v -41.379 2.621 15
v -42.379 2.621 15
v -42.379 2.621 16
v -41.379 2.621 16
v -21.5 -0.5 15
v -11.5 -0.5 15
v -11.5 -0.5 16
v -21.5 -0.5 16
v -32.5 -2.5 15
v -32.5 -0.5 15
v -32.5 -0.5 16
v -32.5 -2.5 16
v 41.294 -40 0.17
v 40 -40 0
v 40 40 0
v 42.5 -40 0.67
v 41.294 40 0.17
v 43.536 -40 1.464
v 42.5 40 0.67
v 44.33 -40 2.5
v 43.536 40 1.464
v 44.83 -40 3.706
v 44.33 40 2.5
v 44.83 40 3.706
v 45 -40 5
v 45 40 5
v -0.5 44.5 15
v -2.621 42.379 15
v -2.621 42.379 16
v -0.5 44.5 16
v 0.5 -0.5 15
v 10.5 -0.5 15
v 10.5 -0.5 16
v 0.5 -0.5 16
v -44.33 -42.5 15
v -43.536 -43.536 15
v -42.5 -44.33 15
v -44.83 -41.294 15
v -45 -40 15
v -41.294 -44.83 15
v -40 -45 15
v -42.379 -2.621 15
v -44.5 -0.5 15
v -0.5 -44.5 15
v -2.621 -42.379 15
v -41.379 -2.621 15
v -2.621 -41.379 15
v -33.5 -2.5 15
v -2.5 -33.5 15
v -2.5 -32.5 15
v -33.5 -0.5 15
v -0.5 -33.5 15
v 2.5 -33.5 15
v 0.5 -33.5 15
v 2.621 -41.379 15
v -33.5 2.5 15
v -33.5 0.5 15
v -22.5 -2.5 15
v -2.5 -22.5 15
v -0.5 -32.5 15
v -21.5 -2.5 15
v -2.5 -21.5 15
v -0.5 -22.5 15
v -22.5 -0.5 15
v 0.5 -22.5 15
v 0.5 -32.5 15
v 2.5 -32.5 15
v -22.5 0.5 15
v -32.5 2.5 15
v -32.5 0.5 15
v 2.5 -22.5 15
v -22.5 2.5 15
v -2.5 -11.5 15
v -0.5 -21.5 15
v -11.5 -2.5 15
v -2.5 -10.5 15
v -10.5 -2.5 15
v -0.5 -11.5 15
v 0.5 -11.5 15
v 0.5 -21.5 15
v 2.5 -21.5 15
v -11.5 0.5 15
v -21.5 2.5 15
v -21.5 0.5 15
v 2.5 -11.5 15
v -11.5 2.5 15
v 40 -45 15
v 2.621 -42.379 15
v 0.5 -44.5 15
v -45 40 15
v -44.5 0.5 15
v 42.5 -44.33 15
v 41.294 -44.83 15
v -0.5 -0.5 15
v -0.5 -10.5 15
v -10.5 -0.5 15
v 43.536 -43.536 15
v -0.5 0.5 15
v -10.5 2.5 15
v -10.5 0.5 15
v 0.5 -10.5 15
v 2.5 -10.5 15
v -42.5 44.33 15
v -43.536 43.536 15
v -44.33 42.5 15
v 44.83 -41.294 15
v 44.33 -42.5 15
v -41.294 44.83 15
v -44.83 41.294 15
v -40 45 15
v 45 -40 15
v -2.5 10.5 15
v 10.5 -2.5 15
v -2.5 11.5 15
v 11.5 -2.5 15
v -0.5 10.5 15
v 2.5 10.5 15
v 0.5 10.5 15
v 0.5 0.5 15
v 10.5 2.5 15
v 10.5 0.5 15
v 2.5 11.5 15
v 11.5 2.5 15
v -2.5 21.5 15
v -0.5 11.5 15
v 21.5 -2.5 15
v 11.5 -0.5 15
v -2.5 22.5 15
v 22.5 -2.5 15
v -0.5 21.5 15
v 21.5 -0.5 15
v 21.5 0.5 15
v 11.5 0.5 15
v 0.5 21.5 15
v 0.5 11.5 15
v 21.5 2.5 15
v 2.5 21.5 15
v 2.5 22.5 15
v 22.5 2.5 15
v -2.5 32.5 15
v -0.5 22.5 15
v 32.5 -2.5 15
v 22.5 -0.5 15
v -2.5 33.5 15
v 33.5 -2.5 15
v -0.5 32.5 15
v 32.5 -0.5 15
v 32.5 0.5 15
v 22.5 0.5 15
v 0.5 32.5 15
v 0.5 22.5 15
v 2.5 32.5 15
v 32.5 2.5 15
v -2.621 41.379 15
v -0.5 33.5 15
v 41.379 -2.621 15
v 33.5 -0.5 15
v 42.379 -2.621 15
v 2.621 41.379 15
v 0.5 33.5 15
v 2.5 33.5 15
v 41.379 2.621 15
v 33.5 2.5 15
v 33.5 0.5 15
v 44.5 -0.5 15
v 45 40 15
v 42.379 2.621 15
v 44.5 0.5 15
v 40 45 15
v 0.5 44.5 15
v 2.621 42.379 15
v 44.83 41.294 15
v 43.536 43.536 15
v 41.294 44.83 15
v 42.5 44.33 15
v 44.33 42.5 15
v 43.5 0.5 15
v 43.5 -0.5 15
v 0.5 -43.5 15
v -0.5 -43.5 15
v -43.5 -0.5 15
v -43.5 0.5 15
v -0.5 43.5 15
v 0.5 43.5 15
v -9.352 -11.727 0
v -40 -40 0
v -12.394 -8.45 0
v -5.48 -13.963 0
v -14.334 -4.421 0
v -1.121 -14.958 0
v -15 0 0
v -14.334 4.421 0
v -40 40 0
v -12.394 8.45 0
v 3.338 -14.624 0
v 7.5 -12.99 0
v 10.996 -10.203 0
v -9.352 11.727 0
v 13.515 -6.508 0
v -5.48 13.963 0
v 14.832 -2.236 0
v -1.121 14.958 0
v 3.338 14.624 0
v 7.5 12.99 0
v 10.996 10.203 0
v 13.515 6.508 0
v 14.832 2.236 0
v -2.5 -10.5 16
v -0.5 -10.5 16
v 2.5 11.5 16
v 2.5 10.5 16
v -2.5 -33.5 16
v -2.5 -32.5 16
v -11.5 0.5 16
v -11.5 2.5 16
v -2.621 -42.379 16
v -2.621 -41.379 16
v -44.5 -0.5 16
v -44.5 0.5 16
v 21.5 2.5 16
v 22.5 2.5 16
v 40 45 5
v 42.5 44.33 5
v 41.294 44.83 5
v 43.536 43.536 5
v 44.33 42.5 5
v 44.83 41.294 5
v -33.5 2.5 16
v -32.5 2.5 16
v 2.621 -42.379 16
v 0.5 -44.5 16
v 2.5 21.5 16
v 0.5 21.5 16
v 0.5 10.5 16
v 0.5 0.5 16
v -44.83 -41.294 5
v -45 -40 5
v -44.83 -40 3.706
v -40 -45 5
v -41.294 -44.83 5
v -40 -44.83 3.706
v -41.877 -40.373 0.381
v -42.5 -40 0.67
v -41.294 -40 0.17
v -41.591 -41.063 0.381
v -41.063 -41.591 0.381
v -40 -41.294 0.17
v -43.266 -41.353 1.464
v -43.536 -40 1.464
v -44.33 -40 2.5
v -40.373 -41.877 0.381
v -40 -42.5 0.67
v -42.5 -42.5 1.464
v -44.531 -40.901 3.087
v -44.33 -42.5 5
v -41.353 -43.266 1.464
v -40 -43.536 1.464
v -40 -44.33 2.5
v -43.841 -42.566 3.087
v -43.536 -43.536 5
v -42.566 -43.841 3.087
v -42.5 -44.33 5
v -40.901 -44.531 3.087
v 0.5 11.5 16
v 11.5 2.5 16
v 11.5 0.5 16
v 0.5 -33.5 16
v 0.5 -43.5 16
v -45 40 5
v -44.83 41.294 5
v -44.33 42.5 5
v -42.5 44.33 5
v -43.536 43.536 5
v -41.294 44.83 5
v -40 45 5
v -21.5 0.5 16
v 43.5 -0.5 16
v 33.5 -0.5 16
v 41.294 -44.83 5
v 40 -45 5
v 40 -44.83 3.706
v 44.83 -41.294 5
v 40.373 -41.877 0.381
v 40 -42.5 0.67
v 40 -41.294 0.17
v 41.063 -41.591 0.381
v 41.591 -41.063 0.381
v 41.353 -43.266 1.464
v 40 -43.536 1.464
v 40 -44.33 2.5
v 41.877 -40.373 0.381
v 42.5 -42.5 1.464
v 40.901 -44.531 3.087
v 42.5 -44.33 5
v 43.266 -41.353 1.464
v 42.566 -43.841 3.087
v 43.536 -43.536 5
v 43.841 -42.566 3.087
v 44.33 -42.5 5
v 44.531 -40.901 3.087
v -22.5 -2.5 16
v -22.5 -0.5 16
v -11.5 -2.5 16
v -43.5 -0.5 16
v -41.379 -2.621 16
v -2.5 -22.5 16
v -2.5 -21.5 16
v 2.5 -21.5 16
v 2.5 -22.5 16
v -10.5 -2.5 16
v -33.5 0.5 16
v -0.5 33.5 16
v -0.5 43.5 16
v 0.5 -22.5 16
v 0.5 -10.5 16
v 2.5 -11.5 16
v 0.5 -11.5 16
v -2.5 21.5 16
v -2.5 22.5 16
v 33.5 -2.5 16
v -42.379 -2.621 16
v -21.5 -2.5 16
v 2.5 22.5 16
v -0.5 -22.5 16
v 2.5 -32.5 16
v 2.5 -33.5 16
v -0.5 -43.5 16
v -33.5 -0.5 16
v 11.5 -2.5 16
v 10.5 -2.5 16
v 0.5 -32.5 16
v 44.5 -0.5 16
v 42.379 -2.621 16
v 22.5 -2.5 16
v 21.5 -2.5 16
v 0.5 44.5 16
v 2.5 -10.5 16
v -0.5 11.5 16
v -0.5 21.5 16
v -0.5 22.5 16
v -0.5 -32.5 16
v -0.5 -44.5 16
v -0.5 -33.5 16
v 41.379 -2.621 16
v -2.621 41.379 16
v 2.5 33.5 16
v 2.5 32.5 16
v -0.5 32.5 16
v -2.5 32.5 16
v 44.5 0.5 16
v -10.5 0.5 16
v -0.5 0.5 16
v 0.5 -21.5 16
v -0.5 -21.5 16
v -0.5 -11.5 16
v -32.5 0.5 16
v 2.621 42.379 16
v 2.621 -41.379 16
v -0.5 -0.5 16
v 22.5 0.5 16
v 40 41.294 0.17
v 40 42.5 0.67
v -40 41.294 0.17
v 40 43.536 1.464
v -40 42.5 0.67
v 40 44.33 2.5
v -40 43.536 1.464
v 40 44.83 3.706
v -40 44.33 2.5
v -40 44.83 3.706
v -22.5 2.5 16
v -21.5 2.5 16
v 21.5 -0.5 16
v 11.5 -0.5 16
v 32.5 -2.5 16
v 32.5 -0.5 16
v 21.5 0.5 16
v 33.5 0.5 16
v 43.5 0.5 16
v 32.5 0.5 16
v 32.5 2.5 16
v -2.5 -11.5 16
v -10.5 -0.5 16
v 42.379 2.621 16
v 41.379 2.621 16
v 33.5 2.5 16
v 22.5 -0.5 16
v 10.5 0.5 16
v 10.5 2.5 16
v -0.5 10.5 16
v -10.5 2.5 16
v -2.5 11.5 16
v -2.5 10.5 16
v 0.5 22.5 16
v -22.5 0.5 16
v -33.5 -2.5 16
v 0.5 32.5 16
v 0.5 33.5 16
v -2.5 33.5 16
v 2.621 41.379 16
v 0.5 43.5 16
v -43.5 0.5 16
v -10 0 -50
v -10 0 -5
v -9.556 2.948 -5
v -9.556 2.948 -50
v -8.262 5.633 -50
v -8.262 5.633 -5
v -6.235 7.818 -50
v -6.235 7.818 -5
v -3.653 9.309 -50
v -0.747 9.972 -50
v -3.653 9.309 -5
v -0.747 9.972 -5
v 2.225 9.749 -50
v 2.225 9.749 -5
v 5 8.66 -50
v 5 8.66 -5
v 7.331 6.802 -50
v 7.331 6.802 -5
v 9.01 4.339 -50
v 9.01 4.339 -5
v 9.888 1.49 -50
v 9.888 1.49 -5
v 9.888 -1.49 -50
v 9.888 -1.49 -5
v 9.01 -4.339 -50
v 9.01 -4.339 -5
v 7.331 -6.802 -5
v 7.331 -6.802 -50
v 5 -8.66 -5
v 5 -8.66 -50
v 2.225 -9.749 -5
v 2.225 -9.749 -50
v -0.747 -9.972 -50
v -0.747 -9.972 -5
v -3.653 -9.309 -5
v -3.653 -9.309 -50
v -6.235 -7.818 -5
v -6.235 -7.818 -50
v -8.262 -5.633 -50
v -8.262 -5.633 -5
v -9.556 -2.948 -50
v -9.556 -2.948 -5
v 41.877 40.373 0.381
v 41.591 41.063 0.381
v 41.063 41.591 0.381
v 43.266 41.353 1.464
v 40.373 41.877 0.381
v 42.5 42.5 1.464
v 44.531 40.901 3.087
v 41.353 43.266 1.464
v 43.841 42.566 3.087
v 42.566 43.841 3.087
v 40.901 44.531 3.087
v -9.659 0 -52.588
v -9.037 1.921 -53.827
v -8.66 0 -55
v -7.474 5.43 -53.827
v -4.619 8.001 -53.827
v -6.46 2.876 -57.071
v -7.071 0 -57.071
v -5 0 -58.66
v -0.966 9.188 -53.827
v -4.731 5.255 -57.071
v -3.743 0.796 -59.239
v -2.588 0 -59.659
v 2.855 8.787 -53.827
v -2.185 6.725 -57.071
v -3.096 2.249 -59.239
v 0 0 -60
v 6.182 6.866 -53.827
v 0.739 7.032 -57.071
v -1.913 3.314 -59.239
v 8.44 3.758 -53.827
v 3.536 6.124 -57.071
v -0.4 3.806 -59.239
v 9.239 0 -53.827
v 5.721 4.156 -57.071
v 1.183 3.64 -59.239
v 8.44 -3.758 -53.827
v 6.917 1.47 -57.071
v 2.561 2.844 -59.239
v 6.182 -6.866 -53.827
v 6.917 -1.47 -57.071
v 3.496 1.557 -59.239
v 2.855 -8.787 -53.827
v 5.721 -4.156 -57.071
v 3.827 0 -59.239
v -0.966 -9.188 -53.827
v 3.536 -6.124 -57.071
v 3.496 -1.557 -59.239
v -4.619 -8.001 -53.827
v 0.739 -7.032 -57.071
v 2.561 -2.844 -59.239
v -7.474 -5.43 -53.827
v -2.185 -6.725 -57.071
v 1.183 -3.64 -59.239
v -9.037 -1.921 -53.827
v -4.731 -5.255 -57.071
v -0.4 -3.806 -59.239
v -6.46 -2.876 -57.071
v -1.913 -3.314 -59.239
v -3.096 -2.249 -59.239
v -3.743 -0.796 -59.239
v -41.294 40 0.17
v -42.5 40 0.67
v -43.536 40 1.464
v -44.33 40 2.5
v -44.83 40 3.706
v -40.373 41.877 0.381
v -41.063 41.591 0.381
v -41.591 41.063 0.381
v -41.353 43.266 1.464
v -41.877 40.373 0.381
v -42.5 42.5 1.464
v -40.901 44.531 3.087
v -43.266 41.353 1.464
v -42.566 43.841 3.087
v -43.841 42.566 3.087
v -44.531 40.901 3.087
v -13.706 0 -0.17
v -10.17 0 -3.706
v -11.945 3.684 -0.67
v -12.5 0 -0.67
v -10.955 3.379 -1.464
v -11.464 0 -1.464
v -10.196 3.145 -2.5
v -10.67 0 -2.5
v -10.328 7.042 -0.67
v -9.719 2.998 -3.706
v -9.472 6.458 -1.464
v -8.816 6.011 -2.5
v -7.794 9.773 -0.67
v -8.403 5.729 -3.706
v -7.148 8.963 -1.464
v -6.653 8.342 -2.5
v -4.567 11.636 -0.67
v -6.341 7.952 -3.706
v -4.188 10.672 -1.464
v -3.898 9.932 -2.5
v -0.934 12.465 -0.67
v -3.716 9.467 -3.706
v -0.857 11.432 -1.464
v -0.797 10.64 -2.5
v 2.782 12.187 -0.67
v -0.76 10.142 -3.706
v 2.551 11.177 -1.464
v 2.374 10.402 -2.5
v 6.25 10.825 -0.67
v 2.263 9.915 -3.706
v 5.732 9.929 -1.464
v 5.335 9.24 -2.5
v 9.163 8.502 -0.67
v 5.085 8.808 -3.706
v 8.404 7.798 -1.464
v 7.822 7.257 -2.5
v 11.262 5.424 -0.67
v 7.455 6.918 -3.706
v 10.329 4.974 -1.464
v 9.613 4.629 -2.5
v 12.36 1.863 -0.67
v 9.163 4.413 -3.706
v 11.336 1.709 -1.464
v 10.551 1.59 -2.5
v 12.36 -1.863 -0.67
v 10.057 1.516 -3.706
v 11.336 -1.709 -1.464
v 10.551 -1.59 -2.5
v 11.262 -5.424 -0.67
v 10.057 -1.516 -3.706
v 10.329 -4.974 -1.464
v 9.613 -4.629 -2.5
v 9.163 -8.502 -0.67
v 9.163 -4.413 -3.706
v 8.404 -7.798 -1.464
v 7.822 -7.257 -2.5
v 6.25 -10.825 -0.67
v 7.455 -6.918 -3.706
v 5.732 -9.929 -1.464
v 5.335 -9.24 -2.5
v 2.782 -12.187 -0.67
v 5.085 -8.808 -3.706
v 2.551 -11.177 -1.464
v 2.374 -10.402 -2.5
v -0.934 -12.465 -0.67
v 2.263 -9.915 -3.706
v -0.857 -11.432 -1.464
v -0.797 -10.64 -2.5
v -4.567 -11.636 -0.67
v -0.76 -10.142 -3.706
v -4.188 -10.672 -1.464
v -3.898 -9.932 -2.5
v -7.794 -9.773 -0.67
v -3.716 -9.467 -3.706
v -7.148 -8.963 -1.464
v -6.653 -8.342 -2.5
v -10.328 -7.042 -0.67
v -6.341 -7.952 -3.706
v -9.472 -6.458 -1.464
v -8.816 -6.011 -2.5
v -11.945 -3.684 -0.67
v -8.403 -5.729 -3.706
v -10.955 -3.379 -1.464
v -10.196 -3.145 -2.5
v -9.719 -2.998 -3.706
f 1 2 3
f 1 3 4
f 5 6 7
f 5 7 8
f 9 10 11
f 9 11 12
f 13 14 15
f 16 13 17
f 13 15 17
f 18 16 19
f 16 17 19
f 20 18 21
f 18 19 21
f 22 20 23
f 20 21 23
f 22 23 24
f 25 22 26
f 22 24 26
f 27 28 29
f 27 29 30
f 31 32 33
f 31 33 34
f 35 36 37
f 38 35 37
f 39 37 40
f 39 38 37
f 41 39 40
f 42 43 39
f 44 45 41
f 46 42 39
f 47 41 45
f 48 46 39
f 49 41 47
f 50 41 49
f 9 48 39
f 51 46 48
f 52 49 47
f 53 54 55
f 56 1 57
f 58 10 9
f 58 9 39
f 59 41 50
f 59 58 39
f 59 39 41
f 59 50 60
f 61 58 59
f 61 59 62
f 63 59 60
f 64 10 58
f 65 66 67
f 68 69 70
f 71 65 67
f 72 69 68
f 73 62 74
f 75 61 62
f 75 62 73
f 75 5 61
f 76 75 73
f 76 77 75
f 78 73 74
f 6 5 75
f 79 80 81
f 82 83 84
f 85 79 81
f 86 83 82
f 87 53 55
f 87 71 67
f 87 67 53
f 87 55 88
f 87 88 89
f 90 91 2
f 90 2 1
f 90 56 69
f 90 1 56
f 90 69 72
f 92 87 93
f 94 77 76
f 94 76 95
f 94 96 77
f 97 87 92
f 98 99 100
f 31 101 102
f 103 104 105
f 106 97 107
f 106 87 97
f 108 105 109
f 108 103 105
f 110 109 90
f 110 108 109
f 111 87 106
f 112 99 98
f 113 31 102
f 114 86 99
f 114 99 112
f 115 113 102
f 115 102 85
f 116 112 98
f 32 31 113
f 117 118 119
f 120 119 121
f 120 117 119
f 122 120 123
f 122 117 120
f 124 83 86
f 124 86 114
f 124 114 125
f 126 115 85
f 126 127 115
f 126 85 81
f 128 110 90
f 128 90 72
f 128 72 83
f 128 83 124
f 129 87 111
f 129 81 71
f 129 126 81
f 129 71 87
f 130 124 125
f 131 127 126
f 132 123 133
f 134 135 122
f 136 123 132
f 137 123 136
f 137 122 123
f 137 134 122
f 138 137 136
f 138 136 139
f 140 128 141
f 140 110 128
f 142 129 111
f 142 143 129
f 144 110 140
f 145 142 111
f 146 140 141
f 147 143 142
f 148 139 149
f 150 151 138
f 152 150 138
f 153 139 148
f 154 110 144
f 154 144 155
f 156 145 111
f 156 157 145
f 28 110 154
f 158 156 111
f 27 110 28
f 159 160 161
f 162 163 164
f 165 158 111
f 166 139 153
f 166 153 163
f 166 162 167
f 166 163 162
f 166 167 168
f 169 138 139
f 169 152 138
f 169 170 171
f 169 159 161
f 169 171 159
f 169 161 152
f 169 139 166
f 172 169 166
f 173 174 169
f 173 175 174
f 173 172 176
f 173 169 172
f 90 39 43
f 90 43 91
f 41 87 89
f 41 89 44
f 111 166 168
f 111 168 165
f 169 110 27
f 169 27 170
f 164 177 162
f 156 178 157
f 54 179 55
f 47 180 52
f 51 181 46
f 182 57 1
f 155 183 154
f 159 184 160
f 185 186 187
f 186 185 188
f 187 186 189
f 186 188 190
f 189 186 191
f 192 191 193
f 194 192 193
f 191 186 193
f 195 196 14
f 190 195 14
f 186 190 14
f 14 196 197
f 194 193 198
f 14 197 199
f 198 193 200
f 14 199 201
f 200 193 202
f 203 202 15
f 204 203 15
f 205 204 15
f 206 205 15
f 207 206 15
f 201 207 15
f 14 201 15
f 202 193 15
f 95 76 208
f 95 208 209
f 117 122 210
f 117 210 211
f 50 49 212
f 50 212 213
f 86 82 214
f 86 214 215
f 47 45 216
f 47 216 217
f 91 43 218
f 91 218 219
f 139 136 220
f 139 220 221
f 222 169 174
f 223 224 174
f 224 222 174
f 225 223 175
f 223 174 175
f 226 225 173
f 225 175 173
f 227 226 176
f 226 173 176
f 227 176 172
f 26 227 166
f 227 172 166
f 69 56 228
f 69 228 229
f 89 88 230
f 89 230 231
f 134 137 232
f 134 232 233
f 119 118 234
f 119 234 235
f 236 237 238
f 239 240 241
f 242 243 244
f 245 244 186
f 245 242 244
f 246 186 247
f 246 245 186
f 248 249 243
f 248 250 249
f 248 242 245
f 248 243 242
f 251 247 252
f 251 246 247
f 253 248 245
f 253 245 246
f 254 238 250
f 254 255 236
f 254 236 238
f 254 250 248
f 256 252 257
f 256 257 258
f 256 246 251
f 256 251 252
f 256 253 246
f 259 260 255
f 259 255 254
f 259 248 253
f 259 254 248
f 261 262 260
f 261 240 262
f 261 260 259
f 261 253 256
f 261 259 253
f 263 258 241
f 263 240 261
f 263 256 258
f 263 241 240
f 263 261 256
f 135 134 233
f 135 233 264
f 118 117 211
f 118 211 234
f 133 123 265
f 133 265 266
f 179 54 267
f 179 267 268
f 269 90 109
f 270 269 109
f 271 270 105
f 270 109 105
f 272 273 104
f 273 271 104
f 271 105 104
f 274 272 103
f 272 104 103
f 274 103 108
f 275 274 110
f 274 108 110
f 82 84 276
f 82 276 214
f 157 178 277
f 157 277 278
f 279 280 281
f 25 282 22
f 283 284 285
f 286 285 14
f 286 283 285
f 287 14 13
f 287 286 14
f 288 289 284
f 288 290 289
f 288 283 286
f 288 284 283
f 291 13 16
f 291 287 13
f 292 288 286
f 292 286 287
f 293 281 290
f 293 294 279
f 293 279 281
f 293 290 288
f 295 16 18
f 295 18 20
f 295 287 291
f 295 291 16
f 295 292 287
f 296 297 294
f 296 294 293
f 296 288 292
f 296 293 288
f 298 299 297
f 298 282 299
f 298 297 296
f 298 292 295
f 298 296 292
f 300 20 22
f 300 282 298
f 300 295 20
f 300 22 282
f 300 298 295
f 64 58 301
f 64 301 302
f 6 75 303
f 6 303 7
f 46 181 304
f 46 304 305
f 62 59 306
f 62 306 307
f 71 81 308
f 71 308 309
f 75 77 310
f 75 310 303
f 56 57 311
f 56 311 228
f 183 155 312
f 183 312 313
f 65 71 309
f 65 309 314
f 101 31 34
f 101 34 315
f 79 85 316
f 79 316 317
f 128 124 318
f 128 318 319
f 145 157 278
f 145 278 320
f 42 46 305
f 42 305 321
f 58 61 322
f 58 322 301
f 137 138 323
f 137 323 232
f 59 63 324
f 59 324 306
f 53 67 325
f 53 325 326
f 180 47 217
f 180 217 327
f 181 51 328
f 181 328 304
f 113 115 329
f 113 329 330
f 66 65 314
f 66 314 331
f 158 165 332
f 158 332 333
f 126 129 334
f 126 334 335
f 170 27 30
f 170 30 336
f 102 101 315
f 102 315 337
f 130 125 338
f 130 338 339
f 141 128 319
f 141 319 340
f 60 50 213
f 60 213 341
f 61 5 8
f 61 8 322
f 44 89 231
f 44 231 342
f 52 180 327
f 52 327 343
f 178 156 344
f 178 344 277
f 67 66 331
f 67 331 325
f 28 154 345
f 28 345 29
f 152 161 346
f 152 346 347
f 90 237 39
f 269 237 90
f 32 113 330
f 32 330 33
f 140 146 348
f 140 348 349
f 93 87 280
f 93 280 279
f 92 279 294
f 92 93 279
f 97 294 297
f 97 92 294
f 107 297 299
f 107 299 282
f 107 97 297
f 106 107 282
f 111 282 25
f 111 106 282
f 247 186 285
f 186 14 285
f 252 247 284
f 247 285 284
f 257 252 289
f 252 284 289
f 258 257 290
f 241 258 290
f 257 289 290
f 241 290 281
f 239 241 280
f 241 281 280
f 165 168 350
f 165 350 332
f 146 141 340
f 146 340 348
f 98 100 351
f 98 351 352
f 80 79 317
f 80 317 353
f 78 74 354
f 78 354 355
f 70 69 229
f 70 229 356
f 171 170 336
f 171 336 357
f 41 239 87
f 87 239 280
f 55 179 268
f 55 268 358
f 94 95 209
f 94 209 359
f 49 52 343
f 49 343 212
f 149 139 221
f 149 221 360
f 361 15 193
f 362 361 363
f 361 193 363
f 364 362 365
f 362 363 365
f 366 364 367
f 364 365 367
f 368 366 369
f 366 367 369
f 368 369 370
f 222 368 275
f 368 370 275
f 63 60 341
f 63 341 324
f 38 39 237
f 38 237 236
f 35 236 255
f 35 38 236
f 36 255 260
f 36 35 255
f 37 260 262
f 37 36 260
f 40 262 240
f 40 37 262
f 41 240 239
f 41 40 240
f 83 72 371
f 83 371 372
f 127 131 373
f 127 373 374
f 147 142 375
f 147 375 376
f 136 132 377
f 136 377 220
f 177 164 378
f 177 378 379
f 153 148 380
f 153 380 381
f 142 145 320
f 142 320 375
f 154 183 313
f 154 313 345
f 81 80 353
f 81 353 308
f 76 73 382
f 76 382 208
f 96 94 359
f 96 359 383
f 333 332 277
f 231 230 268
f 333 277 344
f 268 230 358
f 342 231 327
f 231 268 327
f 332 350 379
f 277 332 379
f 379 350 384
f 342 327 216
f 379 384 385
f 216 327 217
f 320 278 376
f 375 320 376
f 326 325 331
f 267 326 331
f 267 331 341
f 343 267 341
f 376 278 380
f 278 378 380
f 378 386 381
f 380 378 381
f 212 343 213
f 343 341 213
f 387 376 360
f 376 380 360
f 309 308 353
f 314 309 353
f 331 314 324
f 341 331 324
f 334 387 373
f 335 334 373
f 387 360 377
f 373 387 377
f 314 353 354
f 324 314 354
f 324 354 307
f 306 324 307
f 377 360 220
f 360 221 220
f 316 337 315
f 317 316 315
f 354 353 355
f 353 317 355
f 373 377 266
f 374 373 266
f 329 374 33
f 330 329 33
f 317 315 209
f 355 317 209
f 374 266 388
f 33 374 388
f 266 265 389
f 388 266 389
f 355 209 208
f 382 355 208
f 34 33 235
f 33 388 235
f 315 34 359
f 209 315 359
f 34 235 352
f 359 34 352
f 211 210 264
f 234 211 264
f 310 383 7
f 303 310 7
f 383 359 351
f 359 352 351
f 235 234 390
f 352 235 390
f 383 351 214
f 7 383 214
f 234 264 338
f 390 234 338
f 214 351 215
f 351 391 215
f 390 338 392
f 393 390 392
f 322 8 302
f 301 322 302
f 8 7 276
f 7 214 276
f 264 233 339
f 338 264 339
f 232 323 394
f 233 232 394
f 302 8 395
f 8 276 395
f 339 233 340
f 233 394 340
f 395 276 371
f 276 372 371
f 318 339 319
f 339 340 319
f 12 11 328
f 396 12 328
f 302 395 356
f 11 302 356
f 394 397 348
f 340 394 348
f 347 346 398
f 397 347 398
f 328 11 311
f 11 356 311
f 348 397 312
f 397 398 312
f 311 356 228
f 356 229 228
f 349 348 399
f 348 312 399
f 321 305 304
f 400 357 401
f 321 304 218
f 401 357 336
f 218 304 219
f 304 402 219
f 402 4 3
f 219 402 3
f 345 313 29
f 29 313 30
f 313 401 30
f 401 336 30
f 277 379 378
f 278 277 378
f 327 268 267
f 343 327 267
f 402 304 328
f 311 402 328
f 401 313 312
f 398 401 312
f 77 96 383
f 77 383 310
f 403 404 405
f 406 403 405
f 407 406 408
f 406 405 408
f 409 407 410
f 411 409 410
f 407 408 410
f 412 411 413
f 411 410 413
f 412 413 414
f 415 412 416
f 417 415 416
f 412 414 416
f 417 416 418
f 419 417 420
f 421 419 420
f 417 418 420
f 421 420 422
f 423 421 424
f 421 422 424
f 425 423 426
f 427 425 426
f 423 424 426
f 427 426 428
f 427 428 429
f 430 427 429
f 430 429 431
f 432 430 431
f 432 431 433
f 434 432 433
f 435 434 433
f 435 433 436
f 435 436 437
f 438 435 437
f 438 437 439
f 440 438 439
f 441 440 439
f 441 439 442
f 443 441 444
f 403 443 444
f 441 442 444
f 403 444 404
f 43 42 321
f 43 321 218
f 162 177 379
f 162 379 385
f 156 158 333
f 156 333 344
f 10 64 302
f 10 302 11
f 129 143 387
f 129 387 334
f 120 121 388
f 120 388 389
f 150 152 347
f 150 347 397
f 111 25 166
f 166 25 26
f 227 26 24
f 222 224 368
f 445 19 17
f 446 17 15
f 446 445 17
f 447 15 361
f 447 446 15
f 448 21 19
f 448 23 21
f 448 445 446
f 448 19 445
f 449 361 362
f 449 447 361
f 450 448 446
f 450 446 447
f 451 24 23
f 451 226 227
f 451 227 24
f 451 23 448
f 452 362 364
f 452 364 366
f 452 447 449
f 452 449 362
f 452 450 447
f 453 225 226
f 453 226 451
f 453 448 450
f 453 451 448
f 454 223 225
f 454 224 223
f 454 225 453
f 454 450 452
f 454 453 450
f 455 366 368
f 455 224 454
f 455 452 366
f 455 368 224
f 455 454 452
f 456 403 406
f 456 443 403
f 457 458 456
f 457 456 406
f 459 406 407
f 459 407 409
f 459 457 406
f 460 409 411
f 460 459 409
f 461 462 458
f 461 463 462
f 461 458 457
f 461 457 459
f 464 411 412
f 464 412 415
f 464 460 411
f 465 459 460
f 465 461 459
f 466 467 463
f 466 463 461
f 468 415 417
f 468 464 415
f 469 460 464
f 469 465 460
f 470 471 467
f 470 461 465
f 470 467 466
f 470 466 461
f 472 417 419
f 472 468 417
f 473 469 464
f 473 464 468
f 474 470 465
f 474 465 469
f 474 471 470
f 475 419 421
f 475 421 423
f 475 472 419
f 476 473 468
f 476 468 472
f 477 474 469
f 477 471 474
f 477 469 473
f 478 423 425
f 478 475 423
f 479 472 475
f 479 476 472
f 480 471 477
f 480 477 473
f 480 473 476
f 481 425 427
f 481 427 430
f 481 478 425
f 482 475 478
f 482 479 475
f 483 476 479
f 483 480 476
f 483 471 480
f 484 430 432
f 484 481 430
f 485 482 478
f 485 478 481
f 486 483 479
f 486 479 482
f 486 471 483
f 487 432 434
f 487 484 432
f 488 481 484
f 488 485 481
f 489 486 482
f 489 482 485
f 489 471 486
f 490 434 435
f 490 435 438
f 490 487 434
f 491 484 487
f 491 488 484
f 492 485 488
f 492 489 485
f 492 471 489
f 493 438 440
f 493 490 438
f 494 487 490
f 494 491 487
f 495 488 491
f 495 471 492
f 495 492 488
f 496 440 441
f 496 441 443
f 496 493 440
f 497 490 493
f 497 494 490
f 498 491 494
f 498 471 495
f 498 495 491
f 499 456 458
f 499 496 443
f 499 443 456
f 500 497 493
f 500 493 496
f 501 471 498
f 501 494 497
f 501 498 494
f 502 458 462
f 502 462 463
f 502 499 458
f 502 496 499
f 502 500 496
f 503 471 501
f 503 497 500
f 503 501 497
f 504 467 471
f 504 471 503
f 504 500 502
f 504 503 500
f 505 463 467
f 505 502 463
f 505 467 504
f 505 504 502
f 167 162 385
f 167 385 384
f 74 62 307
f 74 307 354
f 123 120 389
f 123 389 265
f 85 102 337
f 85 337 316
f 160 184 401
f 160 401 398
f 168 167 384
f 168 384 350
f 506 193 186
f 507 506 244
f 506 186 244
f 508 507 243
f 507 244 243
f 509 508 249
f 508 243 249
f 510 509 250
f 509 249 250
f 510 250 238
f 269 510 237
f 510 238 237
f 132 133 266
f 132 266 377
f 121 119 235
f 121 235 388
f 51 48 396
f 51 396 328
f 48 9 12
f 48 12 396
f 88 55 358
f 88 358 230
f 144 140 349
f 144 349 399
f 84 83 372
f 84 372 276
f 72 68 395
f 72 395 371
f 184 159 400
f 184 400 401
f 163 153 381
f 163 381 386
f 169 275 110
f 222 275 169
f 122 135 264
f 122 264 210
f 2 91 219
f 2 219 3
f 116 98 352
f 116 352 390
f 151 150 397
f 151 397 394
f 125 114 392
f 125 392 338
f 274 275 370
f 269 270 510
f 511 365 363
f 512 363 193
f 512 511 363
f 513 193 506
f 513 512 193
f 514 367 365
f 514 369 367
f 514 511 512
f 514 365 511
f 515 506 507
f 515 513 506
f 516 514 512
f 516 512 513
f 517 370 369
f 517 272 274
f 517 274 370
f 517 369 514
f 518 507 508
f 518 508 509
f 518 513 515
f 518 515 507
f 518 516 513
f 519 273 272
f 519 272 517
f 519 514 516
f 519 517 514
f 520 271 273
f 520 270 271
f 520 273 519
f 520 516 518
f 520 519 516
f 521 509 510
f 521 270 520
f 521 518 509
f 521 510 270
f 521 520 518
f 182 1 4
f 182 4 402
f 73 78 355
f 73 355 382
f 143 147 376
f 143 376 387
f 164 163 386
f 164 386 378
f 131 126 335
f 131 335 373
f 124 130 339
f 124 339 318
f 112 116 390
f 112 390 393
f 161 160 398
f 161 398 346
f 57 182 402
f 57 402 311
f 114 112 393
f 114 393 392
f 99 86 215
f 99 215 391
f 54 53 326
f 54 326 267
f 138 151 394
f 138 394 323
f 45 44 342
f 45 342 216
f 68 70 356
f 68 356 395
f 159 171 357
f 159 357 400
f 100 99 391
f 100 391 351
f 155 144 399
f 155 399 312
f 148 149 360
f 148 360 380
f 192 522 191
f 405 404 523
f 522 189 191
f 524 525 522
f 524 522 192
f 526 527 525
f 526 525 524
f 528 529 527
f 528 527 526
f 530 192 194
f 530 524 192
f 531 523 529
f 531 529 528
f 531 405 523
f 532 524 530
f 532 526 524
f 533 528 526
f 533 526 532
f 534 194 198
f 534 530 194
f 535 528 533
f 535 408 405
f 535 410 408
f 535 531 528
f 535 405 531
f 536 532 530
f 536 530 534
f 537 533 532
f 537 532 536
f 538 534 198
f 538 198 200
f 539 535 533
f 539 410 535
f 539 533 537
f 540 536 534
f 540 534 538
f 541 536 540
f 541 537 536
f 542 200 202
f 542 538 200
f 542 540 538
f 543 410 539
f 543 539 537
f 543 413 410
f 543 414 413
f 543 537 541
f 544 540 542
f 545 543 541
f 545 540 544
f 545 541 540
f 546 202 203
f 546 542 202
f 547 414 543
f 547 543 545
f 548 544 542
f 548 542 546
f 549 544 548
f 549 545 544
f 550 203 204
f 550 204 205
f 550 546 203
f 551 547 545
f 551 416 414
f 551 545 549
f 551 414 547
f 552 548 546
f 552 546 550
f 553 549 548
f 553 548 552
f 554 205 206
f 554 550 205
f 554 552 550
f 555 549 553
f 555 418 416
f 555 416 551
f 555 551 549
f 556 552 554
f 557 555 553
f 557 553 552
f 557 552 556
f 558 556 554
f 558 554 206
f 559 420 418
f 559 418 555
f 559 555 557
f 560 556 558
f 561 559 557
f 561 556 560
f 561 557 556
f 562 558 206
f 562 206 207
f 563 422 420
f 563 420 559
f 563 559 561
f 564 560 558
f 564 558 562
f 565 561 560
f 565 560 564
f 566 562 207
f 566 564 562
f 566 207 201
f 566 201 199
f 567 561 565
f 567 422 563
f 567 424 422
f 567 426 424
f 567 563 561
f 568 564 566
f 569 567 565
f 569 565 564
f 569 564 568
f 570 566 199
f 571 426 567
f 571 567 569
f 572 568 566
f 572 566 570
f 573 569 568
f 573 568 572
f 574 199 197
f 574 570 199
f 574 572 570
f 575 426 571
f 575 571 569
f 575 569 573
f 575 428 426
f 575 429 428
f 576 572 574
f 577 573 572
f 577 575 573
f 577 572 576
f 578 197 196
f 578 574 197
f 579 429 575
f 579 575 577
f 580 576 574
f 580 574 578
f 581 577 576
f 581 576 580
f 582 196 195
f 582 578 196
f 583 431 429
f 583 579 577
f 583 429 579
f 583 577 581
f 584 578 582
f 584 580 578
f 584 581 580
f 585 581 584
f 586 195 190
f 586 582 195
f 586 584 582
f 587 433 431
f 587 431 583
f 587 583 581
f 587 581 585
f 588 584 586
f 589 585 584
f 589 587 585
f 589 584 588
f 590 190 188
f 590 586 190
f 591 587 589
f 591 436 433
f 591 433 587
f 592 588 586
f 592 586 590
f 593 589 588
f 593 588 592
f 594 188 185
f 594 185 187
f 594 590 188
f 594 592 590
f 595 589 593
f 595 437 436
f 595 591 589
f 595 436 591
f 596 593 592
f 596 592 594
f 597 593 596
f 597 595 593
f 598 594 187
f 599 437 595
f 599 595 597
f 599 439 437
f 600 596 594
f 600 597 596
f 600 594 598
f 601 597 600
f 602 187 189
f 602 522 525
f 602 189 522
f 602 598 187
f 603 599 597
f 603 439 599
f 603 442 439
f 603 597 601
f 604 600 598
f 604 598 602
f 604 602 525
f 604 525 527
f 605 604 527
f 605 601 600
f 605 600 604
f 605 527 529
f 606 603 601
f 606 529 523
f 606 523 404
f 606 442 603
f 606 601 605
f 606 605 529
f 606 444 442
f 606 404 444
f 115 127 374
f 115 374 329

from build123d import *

# Parameters (mm, degrees)
CROQUIS1_W              = 90
CROQUIS1_H              = 90
SALIENTE_EXTRUIR2_DEPTH = 15
CROQUIS2_R              = 10
SALIENTE_EXTRUIR3_DEPTH = 60
SALIENTE_EXTRUIR4_DEPTH = 1
REDONDEO1_R             = 5
REDONDEO2_R             = 5
REDONDEO3_R             = 5
REDONDEO4_R             = 10


with BuildPart() as part:
    # Croquis1 → Saliente-Extruir2 (new body)
    with BuildSketch(Plane.XY):
        Rectangle(CROQUIS1_W, CROQUIS1_H)
    extrude(amount=SALIENTE_EXTRUIR2_DEPTH)

    # Croquis2 → Saliente-Extruir3 (add)
    with BuildSketch(Plane(origin=(0, 0, 0), x_dir=(-1, 0, 0), z_dir=(0, 0, -1))):
        Circle(CROQUIS2_R)
    extrude(amount=SALIENTE_EXTRUIR3_DEPTH)

    # Croquis3 → Saliente-Extruir4 (add)
    with BuildSketch(Plane.XY.offset(15)):
        Polygon((10.5, 0.5), (10.5, 2.5), (11.5, 2.5), (11.5, 0.5), (21.5, 0.5), (21.5, 2.5), (22.5, 2.5), (22.5, 0.5), (32.5, 0.5), (32.5, 2.5), (33.5, 2.5), (33.5, 0.5), (43.5, 0.5), (41.378679656, 2.621320344), (42.378679656, 2.621320344), (44.5, 0.5), (44.5, -0.5), (42.378679656, -2.621320344), (41.378679656, -2.621320344), (43.5, -0.5), (33.5, -0.5), (33.5, -2.5), (32.5, -2.5), (32.5, -0.5), (22.5, -0.5), (22.5, -2.5), (21.5, -2.5), (21.5, -0.5), (11.5, -0.5), (11.5, -2.5), (10.5, -2.5), (10.5, -0.5), (0.5, -0.5), (0.5, -10.5), (2.5, -10.5), (2.5, -11.5), (0.5, -11.5), (0.5, -21.5), (2.5, -21.5), (2.5, -22.5), (0.5, -22.5), (0.5, -32.5), (2.5, -32.5), (2.5, -33.5), (0.5, -33.5), (0.5, -43.5), (2.621320344, -41.378679656), (2.621320344, -42.378679656), (0.5, -44.5), (-0.5, -44.5), (-2.621320344, -42.378679656), (-2.621320344, -41.378679656), (-0.5, -43.5), (-0.5, -33.5), (-2.5, -33.5), (-2.5, -32.5), (-0.5, -32.5), (-0.5, -22.5), (-2.5, -22.5), (-2.5, -21.5), (-0.5, -21.5), (-0.5, -11.5), (-2.5, -11.5), (-2.5, -10.5), (-0.5, -10.5), (-0.5, -0.5), (-10.5, -0.5), (-10.5, -2.5), (-11.5, -2.5), (-11.5, -0.5), (-21.5, -0.5), (-21.5, -2.5), (-22.5, -2.5), (-22.5, -0.5), (-32.5, -0.5), (-32.5, -2.5), (-33.5, -2.5), (-33.5, -0.5), (-43.5, -0.5), (-41.378679656, -2.621320344), (-42.378679656, -2.621320344), (-44.5, -0.5), (-44.5, 0.5), (-42.378679656, 2.621320344), (-41.378679656, 2.621320344), (-43.5, 0.5), (-33.5, 0.5), (-33.5, 2.5), (-32.5, 2.5), (-32.5, 0.5), (-22.5, 0.5), (-22.5, 2.5), (-21.5, 2.5), (-21.5, 0.5), (-11.5, 0.5), (-11.5, 2.5), (-10.5, 2.5), (-10.5, 0.5), (-0.5, 0.5), (-0.5, 10.5), (-2.5, 10.5), (-2.5, 11.5), (-0.5, 11.5), (-0.5, 21.5), (-2.5, 21.5), (-2.5, 22.5), (-0.5, 22.5), (-0.5, 32.5), (-2.5, 32.5), (-2.5, 33.5), (-0.5, 33.5), (-0.5, 43.5), (-2.621320344, 41.378679656), (-2.621320344, 42.378679656), (-0.5, 44.5), (0.5, 44.5), (2.621320344, 42.378679656), (2.621320344, 41.378679656), (0.5, 43.5), (0.5, 33.5), (2.5, 33.5), (2.5, 32.5), (0.5, 32.5), (0.5, 22.5), (2.5, 22.5), (2.5, 21.5), (0.5, 21.5), (0.5, 11.5), (2.5, 11.5), (2.5, 10.5), (0.5, 10.5), (0.5, 0.5), align=None)
    extrude(amount=SALIENTE_EXTRUIR4_DEPTH)

    # Redondeo1
    redondeo1_edges = [part.edges().sort_by_distance(p)[0] for p in [
        (45, -45, 7.5),
        (-45, -45, 7.5),
        (-45, 45, 7.5),
        (45, 45, 7.5),
    ]]
    fillet(redondeo1_edges, radius=REDONDEO1_R)

    # Redondeo2
    redondeo2_edges = [part.edges().sort_by_distance(p)[0] for p in [
        (0, -45, 0),
        (45, 0, 0),
        (-45, 0, 0),
        (0, 45, 0),
        (43.535533906, 43.535533906, 0),
        (-43.535533906, 43.535533906, 0),
        (43.535533906, -43.535533906, 0),
        (-43.535533906, -43.535533906, 0),
    ]]
    fillet(redondeo2_edges, radius=REDONDEO2_R)

    # Redondeo3
    redondeo3_edges = [part.edges().sort_by_distance(p)[0] for p in [
        (10, 0, 0),
    ]]
    fillet(redondeo3_edges, radius=REDONDEO3_R)

    # Redondeo4
    redondeo4_edges = [part.edges().sort_by_distance(p)[0] for p in [
        (10, 0, -60),
    ]]
    fillet(redondeo4_edges, radius=REDONDEO4_R)


solid = part.part
